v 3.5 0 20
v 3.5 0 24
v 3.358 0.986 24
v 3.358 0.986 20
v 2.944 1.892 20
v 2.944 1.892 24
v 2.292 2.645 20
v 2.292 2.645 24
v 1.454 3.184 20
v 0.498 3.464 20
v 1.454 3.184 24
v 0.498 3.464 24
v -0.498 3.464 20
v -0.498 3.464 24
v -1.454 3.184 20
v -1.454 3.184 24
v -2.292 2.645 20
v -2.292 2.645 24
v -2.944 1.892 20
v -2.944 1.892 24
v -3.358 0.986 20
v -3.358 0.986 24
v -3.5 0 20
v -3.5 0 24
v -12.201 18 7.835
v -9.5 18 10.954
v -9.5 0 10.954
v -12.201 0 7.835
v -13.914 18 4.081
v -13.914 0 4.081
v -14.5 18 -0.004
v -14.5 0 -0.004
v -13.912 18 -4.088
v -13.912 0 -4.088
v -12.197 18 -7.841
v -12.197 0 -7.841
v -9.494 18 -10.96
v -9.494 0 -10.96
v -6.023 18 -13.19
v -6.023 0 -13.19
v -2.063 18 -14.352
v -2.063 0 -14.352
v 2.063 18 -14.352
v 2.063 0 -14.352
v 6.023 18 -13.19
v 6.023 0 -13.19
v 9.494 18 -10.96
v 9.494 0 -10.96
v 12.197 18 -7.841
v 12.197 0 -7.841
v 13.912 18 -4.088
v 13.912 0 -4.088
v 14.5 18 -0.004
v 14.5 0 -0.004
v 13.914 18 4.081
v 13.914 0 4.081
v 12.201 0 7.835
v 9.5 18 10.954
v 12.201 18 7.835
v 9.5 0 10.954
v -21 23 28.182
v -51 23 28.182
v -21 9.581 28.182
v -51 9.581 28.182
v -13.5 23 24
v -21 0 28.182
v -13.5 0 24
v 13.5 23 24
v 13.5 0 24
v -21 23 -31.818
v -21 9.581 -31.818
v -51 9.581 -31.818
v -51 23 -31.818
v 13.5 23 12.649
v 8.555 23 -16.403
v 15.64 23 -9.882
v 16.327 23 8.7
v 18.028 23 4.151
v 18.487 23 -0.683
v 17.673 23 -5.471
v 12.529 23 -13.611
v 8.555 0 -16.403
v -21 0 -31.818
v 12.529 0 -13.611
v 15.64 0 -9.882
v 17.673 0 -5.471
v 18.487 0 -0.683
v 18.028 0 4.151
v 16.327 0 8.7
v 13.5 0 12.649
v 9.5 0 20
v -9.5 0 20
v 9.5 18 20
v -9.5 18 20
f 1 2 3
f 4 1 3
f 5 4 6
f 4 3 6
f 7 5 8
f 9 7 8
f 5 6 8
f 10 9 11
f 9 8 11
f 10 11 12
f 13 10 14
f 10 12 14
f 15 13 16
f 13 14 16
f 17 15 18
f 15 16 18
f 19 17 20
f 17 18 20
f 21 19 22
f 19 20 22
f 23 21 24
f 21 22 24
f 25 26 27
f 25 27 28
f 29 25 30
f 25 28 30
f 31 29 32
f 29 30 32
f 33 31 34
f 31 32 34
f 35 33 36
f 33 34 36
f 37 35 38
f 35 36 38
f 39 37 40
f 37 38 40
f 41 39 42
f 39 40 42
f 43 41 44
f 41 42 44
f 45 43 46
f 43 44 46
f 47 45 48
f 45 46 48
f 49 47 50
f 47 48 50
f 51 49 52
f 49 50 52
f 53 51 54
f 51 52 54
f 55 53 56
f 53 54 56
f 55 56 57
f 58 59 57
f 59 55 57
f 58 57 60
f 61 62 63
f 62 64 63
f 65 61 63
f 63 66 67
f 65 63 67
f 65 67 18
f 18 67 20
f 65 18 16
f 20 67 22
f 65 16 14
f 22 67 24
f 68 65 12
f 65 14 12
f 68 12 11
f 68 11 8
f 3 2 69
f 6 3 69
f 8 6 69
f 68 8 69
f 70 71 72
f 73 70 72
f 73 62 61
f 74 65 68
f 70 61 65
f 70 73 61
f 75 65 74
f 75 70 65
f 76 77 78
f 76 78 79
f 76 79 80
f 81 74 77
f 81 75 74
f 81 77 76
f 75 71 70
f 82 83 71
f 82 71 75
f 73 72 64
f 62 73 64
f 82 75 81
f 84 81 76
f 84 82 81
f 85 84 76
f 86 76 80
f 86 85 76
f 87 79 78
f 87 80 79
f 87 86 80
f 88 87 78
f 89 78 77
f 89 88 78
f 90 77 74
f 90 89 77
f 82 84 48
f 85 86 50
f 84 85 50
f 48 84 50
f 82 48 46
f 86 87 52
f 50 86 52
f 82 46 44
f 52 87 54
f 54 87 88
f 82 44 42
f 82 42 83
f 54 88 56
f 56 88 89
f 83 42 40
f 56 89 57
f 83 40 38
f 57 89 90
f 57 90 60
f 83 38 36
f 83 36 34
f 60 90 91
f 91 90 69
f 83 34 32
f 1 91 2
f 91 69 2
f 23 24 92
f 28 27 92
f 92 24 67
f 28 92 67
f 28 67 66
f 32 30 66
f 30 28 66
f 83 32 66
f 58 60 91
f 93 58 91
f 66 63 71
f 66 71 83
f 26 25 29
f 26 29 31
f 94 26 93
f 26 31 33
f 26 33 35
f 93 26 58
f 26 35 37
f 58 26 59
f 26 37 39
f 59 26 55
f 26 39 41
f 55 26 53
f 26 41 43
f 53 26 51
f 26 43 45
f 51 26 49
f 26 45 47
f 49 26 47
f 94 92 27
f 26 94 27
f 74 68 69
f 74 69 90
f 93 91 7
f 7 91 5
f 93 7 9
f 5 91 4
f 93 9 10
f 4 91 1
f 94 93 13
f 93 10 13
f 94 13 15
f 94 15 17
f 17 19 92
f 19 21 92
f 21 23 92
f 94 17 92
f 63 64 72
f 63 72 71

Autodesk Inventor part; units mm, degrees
ref_plane "YZ Plane" through (0, 0, 0) normal (1, 0, 0) x (0, 1, 0)
ref_plane "XZ Plane" through (0, 0, 0) normal (0, 1, 0) x (-1, 0, 0)
ref_plane "XY Plane" through (0, 0, 0) normal (0, 0, 1) x (1, 0, 0)
sketch "Sketch1" plane through (0, 0, 0) normal (0, 1, 0) x (-1, 0, 0)
  arc A0 (-9.5, 10.9545) -> (9.5, 10.9545) centre (0, 0) ccw
  line L0 (-9.5, 10.9545) -> (-9.5, 20)
  line L1 (-9.5, 20) -> (9.5, 20)
  line L2 (9.5, 20) -> (9.5, 10.9545)
  line L3 (13.5, 12.6491) -> (13.5, 24)
  line L4 (13.5, 24) -> (-13.5, 24)
  line L5 (-13.5, 24) -> (-13.5, 12.6491)
  arc A1 (-13.5, 12.6491) -> (13.5, 12.6491) centre (0, 0) ccw
  point P0 (0, -20)
  point P1 (-9.5, 15)
  dimension "d0" = 0
  dimension "d1" = 29
  dimension "d6" = 20
  dimension "d7" = 19
  dimension "d8" = 4
extrude "Extrusion1" add sketch "Sketch1" along normal blind 18
sketch "Sketch2" plane through (0, 18, 0) normal (0, 1, 0) x (1, 0, 0)
  arc A0 (13.5, -12.6491) -> (-13.5, -12.6491) centre (0, 0) ccw
  line L0 (-13.5, -12.6491) -> (-13.5, -24) projected
  line L1 (-13.5, -24) -> (13.5, -24)
  line L2 (13.5, -24) -> (13.5, -12.6491)
  line L3 (-13.5, -12.6491) -> (-13.5, -24)
extrude "Extrusion2" add sketch "Sketch2" along normal blind 5
sketch "Sketch3" plane through (-13.5, 0, 24) normal (0, 0, 1) x (1, 0, 0)
  circle A0 centre (13.5, 0) radius 3.5
  dimension "d13" = 7
extrude "Extrusion3" cut sketch "Sketch3" against normal blind 5
sketch "Sketch4" plane through (0, 0, 0) normal (0, -1, 0) x (1, 0, 0)
  line L0 (0, 0) -> (-21, 0)
  line L1 (-21, -31.8183) -> (-51, -31.8183)
  line L2 (-51, -31.8183) -> (-51, 28.1817)
  line L3 (-51, 28.1817) -> (-21, 28.1817)
  line L4 (-21, 28.1817) -> (-21, -31.8183)
  line L5 (-13.5, 24) -> (13.5, 24) projected
  line L6 (-21, 28.1817) -> (-13.5, 24)
  line L7 (-21, -31.8183) -> (8.5554, -16.4029)
  arc A0 (-13.5, 12.6491) -> (13.5, 12.6491) centre (0, 0) ccw projected
  arc A1 (-13.5, 12.6491) -> (8.5554, -16.4029) centre (0, 0) ccw
  line L8 (-13.5, 12.6491) -> (-13.5, 24) projected
  line L9 (-13.5, 24) -> (-13.5, 12.6491)
  dimension "d19" = 21
  dimension "d20" = 30
  dimension "d21" = 60
extrude "Extrusion4" add sketch "Sketch4" against normal blind 23
sketch "Sketch6" plane through (-21, 0, -31.8183) normal (0, 0, -1) x (-1, 0, 0)
  line L0 (0, 0) -> (-29.5554, 0) projected
  line L1 (0, 0) -> (30.3611, 0)
  line L2 (30.3611, 0) -> (30.3611, 9.5813)
  line L3 (30.3611, 9.5813) -> (0, 9.5813)
  line L4 (0, 9.5813) -> (0, 0)
  point P0 (-21, 0)
  dimension "d26" = 9.5813
extrude "Extrusion5" cut sketch "Sketch6" against normal through all
properties part number "pitch_motor_standoff_v1"
